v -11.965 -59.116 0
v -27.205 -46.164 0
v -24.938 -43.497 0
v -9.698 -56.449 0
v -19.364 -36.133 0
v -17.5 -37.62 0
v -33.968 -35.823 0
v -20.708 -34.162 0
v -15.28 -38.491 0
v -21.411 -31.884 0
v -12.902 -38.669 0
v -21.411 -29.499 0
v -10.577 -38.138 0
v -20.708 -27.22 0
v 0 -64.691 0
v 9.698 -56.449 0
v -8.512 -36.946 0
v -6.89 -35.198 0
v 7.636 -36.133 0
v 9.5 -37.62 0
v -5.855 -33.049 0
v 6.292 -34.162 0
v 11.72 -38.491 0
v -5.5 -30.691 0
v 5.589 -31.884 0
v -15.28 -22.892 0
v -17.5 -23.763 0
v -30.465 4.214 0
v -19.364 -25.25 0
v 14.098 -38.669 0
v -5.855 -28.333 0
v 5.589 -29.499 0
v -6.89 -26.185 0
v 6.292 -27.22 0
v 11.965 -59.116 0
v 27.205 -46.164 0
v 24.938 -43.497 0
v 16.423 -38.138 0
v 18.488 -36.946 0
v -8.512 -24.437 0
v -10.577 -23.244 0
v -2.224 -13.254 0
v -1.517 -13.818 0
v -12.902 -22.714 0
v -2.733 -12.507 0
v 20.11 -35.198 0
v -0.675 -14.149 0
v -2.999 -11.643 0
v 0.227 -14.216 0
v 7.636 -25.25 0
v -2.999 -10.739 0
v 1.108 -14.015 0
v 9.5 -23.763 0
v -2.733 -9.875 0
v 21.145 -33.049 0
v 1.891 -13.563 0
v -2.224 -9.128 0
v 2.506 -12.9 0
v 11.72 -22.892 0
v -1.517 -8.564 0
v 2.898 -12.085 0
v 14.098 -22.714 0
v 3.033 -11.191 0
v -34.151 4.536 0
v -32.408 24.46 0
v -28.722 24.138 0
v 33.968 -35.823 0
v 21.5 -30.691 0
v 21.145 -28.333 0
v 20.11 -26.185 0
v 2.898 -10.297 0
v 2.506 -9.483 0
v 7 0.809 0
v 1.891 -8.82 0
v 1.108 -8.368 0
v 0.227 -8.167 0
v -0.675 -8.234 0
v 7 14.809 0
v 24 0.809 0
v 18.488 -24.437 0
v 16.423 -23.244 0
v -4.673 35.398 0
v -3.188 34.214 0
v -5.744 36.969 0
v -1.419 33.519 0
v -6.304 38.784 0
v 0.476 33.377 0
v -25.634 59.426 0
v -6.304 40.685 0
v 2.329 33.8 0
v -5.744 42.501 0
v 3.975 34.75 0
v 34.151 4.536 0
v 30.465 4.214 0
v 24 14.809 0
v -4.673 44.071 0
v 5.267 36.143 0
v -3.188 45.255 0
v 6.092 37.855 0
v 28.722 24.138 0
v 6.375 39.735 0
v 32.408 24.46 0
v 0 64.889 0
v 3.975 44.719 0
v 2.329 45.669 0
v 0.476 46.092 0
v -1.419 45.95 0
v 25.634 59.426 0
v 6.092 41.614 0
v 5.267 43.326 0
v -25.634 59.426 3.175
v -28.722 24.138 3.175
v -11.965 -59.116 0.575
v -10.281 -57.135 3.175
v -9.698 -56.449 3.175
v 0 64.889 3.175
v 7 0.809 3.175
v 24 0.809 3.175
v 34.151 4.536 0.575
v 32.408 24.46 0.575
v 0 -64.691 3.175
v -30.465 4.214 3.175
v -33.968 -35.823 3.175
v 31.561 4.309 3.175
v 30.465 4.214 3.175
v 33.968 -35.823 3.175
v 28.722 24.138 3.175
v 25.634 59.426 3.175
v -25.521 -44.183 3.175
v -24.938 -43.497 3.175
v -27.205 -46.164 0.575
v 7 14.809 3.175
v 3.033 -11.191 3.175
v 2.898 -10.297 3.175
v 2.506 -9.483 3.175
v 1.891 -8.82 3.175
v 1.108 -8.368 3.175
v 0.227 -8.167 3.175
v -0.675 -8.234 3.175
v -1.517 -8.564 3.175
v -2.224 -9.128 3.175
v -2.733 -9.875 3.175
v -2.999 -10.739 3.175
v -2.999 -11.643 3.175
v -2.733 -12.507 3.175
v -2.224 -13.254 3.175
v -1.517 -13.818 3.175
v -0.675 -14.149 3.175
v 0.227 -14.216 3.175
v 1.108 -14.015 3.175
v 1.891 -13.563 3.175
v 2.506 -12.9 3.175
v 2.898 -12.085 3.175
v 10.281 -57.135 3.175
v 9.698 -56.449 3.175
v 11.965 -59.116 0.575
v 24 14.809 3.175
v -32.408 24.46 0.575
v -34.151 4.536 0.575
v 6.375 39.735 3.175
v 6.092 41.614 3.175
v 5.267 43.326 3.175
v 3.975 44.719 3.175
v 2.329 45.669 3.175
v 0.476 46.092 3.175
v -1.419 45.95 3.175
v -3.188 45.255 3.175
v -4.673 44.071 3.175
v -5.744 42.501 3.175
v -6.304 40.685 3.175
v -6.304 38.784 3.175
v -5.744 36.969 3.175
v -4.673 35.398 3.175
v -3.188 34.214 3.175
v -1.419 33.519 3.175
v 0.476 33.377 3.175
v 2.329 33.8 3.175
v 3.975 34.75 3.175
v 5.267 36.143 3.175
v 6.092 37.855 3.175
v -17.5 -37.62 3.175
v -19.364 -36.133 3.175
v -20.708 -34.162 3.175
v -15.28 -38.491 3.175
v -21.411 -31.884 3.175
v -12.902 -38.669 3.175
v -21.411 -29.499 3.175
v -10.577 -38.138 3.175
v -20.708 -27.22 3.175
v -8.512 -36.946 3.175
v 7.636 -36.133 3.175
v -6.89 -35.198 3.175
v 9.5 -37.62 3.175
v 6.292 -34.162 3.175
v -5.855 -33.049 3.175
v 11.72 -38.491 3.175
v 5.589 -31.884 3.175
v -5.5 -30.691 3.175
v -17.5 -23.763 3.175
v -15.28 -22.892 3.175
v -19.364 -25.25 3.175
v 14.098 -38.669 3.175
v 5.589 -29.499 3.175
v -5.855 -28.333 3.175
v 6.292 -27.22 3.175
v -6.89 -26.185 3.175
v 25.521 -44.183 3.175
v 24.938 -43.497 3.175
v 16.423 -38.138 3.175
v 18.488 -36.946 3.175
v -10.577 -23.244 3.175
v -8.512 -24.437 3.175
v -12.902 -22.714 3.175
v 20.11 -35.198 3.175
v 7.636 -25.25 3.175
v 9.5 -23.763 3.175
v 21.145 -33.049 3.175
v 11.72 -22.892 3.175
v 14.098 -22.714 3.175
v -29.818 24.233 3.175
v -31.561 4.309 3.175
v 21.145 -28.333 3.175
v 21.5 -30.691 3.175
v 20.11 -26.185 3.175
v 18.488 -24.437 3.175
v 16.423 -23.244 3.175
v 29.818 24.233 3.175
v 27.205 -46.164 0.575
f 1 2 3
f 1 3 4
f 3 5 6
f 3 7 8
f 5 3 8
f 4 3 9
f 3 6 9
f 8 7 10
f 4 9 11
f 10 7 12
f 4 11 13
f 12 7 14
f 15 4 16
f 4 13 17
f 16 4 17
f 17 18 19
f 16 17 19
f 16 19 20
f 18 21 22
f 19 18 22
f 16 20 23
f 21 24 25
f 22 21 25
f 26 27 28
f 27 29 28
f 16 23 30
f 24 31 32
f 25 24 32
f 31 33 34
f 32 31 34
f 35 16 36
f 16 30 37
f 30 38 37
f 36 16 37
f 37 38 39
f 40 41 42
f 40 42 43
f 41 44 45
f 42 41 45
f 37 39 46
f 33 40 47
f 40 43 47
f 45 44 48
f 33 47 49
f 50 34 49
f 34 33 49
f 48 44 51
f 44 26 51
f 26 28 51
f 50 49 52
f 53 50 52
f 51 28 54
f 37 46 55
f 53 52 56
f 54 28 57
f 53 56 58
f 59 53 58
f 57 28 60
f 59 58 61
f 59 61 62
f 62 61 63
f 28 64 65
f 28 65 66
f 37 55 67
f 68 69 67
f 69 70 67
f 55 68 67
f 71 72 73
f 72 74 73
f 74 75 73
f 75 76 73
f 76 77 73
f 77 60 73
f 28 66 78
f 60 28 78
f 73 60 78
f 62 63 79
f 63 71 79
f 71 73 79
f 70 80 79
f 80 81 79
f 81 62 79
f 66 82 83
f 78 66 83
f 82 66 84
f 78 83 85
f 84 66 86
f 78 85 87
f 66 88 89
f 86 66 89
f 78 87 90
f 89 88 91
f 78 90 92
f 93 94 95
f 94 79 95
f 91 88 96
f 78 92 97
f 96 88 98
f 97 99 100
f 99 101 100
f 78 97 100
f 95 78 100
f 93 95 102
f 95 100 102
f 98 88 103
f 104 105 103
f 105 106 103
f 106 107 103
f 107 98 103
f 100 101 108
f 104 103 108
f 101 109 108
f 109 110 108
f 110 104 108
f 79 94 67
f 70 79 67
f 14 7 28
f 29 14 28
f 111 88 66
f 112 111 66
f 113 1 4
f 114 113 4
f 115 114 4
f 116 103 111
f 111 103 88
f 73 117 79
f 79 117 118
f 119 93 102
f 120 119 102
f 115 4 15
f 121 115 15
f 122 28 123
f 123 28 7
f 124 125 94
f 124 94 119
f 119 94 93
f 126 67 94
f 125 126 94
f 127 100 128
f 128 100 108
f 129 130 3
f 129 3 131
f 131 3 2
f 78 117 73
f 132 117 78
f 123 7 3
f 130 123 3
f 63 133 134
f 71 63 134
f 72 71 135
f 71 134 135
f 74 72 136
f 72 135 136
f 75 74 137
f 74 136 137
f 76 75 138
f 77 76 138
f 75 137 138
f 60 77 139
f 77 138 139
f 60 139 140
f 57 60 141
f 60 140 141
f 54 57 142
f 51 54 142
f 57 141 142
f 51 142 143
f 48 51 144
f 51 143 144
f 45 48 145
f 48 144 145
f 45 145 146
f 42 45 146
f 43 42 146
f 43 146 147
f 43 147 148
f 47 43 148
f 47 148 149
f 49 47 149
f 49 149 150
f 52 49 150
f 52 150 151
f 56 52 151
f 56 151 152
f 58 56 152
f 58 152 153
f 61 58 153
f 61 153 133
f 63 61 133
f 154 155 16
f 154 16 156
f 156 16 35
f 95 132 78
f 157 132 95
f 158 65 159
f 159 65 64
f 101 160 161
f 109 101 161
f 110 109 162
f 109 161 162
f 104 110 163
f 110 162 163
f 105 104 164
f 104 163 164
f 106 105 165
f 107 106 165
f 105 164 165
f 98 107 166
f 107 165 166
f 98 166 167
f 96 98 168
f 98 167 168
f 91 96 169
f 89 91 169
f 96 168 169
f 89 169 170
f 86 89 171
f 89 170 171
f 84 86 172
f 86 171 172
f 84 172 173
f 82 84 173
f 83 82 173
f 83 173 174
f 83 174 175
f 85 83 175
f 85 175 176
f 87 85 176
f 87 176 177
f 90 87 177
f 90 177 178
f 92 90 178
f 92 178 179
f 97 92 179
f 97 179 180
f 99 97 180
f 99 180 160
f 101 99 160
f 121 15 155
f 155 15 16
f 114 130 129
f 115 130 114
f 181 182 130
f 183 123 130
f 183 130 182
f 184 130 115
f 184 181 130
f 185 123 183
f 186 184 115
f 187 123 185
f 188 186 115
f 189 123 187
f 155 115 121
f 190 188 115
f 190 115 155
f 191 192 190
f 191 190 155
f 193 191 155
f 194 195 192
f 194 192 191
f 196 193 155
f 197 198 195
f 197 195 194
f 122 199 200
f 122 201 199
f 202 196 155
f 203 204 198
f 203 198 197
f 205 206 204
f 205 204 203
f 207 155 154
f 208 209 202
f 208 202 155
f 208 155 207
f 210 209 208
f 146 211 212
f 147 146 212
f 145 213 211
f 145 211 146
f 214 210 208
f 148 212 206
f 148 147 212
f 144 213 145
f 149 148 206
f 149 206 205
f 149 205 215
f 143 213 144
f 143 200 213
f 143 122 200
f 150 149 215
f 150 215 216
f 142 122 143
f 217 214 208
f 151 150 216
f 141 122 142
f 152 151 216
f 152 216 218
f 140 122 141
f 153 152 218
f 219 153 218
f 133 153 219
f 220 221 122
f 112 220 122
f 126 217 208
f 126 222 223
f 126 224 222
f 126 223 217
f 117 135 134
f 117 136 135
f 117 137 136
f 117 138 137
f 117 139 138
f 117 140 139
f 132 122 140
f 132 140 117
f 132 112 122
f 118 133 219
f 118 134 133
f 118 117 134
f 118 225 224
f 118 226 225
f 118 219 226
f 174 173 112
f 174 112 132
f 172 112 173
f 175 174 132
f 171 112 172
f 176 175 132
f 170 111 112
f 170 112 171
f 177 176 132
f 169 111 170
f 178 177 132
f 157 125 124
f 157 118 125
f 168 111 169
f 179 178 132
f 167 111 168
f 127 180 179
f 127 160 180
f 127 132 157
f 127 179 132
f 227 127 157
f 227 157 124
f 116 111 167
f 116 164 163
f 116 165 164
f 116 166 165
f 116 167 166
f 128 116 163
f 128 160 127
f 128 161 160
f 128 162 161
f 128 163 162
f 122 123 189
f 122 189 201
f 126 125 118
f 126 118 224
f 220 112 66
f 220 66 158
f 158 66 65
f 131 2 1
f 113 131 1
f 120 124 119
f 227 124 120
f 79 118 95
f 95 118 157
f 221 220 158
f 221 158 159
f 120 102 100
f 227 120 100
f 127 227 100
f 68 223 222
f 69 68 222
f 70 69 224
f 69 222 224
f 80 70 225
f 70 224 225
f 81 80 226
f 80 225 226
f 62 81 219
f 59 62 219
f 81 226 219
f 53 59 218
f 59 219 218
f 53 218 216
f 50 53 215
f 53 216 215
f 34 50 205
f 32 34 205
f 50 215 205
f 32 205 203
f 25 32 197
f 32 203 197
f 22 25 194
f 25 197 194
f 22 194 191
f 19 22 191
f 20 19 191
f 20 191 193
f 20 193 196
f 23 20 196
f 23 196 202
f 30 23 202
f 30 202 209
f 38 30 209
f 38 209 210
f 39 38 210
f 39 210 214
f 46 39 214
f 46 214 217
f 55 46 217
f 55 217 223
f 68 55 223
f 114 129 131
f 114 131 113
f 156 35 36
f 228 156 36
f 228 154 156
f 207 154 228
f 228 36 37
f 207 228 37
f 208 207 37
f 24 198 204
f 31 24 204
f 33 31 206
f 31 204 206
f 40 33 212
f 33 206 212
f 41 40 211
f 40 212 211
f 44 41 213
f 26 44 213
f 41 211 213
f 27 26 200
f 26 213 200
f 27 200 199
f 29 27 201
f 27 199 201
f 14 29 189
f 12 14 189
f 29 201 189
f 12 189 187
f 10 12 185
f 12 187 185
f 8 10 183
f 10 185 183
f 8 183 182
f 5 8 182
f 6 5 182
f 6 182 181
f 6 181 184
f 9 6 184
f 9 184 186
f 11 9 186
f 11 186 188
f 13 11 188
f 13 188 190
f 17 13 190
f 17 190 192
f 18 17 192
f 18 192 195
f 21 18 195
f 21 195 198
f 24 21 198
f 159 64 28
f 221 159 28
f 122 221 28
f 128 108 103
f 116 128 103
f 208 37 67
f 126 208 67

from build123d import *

# Parameters (mm, degrees)
BOSS_EXTRUDE2_DEPTH = 3.175
CHAMFER3_SIZE       = 2.6
SKETCH3_R           = 8
SKETCH3_R_2         = 3.03324197
SKETCH3_R_3         = 6.375
SKETCH3_W           = 17
SKETCH3_H           = 14
CUT_EXTRUDE1_DEPTH  = 10


with BuildPart() as part:
    # Sketch2 → Boss-Extrude2 (new body)
    with BuildSketch(Plane.XY):
        Polygon((33.967630838, -35.823456397), (25.63439182, 59.425901431), (0, 64.888689731), (-25.63439182, 59.425901431), (-33.967630838, -35.823456397), (0, -64.691310269), align=None)
        Polygon((-30.464841537, 4.213608519), (-28.721726682, 24.137502481), (-32.407647065, 24.459978729), (-34.15076192, 4.536084767), align=None)
        Polygon((32.407647065, 24.459978729), (28.721726682, 24.137502481), (30.464841537, 4.213608519), (34.15076192, 4.536084767), align=None)
        Polygon((27.2046006, -46.164342336), (24.938042288, -43.497375254), (9.698230388, -56.449137036), (11.9647887, -59.116104119), align=None)
        Polygon((-9.698230388, -56.449137036), (-24.938042288, -43.497375254), (-27.2046006, -46.164342336), (-11.9647887, -59.116104119), align=None)
    extrude(amount=BOSS_EXTRUDE2_DEPTH)

    # Chamfer3
    chamfer3_edges = [part.edges().sort_by_distance(p)[0] for p in [
        (19.58469465, -52.640223227, 3.175),
        (33.279204493, 14.498031748, 3.175),
        (-33.279204493, 14.498031748, 3.175),
        (-19.58469465, -52.640223227, 3.175),
    ]]
    chamfer(chamfer3_edges, length=CHAMFER3_SIZE)

    # Sketch3 → Cut-Extrude1 (cut)
    with BuildSketch(Plane.XY.offset(3.175)):
        with Locations((13.5, -30.691310269)):
            Circle(SKETCH3_R)
        with Locations((-13.5, -30.691310269)):
            Circle(SKETCH3_R)
        with Locations((0, -11.191310269)):
            Circle(SKETCH3_R_2)
        with Locations((0, 39.734509442)):
            Circle(SKETCH3_R_3)
        with Locations((15.5, 7.808689731)):
            Rectangle(SKETCH3_W, SKETCH3_H)
    extrude(amount=-CUT_EXTRUDE1_DEPTH, mode=Mode.SUBTRACT)


solid = part.part
